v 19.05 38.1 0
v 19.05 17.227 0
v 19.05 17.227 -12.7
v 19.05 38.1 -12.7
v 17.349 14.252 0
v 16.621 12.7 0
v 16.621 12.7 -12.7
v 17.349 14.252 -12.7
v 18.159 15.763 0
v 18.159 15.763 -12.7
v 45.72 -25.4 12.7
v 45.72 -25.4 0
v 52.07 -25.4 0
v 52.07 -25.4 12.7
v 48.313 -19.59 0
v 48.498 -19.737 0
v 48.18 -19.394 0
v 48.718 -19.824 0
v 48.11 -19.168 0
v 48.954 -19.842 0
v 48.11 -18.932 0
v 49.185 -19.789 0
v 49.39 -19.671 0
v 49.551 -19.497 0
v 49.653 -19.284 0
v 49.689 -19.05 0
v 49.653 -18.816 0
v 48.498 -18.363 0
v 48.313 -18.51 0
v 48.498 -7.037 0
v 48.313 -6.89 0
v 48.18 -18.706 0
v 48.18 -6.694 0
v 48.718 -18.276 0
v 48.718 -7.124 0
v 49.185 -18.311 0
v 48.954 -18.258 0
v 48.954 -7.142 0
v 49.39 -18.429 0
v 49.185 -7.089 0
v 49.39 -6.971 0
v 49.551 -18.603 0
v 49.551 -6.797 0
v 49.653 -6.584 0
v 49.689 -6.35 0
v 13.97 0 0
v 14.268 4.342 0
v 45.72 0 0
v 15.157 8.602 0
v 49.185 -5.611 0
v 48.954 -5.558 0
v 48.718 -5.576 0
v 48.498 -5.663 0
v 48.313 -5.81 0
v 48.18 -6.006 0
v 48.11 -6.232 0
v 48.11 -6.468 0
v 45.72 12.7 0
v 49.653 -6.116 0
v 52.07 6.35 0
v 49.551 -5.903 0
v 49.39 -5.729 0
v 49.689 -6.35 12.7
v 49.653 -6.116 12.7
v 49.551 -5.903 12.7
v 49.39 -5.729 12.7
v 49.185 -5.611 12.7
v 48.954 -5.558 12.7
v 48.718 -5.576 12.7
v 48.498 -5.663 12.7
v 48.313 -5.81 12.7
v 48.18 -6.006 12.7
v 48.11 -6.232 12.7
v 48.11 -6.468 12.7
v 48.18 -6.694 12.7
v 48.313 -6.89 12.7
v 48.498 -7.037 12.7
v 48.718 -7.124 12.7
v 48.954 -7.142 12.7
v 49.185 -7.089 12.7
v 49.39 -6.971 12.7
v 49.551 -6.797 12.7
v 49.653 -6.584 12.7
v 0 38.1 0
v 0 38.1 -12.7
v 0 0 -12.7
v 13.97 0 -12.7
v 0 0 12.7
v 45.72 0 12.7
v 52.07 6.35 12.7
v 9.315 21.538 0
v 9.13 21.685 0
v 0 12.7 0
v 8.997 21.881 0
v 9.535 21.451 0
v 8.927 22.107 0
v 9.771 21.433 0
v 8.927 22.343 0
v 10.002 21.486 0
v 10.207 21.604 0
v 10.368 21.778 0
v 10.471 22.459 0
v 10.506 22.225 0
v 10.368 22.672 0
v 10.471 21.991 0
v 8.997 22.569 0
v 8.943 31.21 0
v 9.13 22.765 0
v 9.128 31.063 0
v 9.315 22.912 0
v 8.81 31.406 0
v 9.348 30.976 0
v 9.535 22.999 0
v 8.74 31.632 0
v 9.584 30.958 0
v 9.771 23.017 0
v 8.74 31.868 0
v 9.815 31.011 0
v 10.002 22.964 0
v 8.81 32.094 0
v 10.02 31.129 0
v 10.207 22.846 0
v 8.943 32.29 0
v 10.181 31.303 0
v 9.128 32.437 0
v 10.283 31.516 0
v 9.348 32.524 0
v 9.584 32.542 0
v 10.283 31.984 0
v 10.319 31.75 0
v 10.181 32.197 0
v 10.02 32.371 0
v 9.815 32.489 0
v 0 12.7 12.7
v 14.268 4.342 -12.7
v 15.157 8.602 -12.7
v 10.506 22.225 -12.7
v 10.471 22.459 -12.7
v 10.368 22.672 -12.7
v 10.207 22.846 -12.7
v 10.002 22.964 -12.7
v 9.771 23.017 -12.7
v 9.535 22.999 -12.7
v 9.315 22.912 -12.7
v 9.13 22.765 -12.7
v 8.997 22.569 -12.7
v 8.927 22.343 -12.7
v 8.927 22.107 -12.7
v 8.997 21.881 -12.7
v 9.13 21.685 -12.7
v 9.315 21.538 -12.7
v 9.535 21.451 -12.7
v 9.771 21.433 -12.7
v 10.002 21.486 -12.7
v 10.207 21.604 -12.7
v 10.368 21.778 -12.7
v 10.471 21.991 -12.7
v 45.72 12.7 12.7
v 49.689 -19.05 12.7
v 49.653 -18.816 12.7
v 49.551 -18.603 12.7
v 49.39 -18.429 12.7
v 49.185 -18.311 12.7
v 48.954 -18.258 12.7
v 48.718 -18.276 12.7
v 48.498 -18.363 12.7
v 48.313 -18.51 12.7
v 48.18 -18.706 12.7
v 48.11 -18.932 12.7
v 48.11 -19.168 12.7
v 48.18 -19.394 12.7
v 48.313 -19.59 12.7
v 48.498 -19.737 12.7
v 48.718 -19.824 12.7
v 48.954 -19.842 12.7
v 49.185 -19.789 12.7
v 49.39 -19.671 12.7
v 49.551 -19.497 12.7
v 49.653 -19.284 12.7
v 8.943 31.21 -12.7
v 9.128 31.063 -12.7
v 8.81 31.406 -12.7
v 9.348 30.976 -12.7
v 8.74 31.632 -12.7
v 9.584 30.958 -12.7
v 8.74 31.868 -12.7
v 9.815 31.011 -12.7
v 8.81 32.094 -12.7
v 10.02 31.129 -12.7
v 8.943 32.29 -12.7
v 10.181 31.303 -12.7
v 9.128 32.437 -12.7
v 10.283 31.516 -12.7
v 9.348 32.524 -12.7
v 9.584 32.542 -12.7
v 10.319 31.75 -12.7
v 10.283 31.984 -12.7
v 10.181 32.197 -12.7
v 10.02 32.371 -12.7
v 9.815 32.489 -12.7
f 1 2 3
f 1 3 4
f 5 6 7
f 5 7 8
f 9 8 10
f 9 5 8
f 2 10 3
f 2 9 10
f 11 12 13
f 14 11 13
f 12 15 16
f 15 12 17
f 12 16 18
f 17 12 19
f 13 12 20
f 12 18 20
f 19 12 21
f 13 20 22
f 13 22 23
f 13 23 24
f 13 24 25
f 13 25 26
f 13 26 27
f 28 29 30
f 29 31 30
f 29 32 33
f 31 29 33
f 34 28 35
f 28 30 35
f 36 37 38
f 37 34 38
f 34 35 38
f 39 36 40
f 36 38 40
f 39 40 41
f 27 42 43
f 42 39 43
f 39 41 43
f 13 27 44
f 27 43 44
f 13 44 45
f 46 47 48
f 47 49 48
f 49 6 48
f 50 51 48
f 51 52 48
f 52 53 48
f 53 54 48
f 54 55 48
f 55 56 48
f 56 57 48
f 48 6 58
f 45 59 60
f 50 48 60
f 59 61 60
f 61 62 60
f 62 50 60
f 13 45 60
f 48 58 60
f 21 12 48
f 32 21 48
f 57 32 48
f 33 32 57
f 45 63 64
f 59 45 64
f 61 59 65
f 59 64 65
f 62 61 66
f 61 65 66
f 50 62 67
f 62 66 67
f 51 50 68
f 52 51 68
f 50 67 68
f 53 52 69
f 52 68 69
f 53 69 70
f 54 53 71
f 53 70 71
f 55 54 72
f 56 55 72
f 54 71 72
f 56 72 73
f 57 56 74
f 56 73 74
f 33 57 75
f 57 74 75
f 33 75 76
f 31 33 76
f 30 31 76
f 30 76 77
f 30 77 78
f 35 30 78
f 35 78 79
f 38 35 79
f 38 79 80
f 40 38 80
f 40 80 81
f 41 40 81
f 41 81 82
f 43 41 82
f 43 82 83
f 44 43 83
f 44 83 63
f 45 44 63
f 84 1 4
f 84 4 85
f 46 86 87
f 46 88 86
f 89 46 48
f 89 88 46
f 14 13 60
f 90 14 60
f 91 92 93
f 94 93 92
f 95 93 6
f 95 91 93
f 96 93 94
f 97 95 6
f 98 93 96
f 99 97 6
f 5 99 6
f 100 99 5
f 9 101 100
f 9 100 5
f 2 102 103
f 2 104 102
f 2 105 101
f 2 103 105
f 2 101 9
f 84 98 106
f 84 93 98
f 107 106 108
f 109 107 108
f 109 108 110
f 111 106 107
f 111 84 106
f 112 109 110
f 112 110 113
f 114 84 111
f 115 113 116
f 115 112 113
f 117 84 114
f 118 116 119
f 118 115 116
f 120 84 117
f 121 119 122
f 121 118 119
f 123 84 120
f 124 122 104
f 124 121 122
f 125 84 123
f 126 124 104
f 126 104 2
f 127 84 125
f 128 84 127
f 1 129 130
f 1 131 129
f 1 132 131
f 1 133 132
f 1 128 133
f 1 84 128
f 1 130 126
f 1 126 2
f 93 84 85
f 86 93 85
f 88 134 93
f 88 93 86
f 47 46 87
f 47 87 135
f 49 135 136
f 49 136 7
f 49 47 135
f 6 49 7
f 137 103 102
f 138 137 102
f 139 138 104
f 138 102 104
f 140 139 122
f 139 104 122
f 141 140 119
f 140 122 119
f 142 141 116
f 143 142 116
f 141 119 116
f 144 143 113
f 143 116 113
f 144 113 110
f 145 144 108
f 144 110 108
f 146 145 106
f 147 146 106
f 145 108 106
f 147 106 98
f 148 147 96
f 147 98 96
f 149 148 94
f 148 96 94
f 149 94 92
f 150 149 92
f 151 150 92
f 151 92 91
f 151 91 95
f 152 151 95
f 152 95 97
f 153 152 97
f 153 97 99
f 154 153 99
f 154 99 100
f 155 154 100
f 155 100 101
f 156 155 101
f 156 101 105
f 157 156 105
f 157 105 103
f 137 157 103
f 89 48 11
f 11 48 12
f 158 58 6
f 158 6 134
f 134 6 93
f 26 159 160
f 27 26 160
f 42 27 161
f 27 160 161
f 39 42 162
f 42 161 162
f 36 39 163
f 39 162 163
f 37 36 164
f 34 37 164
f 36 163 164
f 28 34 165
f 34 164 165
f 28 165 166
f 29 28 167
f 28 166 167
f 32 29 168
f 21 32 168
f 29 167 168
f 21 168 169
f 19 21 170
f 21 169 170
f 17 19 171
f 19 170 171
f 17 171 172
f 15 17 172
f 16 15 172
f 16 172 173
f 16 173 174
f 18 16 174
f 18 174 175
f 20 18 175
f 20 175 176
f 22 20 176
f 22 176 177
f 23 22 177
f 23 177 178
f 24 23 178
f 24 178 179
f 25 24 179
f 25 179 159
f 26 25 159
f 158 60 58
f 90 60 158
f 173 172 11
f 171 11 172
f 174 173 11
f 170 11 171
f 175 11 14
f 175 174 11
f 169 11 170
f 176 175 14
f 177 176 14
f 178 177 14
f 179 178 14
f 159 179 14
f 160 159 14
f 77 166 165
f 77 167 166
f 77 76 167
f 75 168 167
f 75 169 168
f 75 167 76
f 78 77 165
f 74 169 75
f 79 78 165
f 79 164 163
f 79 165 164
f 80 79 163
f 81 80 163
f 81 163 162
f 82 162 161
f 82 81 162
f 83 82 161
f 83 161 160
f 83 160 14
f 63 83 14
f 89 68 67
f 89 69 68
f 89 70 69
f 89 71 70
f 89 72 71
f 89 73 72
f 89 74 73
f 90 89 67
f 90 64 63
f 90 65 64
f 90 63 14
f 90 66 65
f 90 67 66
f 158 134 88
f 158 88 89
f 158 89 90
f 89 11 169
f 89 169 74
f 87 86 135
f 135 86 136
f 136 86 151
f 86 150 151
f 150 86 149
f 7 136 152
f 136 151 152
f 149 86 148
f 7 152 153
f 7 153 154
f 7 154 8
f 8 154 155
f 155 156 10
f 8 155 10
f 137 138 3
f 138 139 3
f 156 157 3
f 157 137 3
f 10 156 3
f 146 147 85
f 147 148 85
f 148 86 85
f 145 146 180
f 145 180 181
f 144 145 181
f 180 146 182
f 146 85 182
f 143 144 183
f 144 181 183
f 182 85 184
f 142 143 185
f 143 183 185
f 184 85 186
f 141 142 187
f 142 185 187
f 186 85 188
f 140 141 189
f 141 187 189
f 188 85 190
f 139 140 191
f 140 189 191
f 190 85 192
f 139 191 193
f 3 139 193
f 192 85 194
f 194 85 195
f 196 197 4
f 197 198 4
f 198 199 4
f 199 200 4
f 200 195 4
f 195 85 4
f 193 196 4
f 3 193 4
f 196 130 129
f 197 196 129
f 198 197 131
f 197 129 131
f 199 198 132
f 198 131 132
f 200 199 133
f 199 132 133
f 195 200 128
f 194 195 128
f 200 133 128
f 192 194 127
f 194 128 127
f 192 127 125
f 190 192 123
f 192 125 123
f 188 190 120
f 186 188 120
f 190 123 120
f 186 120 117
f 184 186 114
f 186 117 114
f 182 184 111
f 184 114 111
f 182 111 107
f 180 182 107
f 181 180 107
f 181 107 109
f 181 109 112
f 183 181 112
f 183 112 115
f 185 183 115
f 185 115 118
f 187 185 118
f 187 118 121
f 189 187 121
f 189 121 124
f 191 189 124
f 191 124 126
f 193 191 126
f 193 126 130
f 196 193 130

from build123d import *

# Parameters (mm, degrees)
F0_W     = 26.67
F0_H     = 12.7
F1_DEPTH = 12.7
F2_DEPTH = 12.7
F3_SIZE  = 6.35
F4_R     = 0.79375
F5_DEPTH = 25.401
F6_R     = 0.79375
F7_DEPTH = 12.701


with BuildPart() as f1:
    # F0 (on Top) → F1 (new body)
    with BuildSketch(Plane.XY):
        with Locations((32.385, 6.35)):
            Rectangle(F0_W, F0_H)
        with BuildLine():
            ThreePointArc((13.97, 0), (14.639725, 6.486831), (16.620644, 12.7))
            Line((16.620644, 12.7), (0, 12.7))
            Line((0, 12.7), (0, 0))
            Line((0, 0), (13.97, 0))
        make_face()
        Polygon((52.07, 12.7), (45.72, 12.7), (45.72, 0), (45.72, -25.4), (52.07, -25.4), (52.07, 0), align=None)
        with BuildLine():
            Line((19.05, 0), (19.05, 12.7))
            Line((19.05, 12.7), (16.620644, 12.7))
            ThreePointArc((16.620644, 12.7), (14.639725, 6.486831), (13.97, 0))
            Line((13.97, 0), (19.05, 0))
        make_face()
    extrude(amount=F1_DEPTH)

    # F0 (on Top) → F2 (join)
    with BuildSketch(Plane.XY):
        with BuildLine():
            ThreePointArc((13.97, 0), (14.639725, 6.486831), (16.620644, 12.7))
            Line((16.620644, 12.7), (0, 12.7))
            Line((0, 12.7), (0, 0))
            Line((0, 0), (13.97, 0))
        make_face()
        with BuildLine():
            Line((0, 12.7), (16.620644, 12.7))
            ThreePointArc((16.620644, 12.7), (17.7436, 15.012779), (19.05, 17.227118))
            Line((19.05, 17.227118), (19.05, 38.1))
            Line((19.05, 38.1), (0, 38.1))
            Line((0, 38.1), (0, 12.7))
        make_face()
    extrude(amount=-F2_DEPTH)

    # F3
    f3_edges = [f1.edges().sort_by_distance(p)[0] for p in [
        (52.07, 12.7, 6.35),
    ]]
    chamfer(f3_edges, length=F3_SIZE)

    # F4 (on face) → F5 (cut, through all)
    with BuildSketch(Plane.XY.offset(12.7)):
        with Locations((48.895, -6.35)):
            Circle(F4_R)
        with Locations((48.895, -19.05)):
            Circle(F4_R)
    extrude(amount=-F5_DEPTH, mode=Mode.SUBTRACT)

    # F6 (on face) → F7 (cut, through all)
    with BuildSketch(Plane.XY):
        with Locations((9.525, 31.75)):
            Circle(F6_R)
        with Locations((9.712074, 22.225)):
            Circle(F6_R)
    extrude(amount=-F7_DEPTH, mode=Mode.SUBTRACT)


solid = f1.part
